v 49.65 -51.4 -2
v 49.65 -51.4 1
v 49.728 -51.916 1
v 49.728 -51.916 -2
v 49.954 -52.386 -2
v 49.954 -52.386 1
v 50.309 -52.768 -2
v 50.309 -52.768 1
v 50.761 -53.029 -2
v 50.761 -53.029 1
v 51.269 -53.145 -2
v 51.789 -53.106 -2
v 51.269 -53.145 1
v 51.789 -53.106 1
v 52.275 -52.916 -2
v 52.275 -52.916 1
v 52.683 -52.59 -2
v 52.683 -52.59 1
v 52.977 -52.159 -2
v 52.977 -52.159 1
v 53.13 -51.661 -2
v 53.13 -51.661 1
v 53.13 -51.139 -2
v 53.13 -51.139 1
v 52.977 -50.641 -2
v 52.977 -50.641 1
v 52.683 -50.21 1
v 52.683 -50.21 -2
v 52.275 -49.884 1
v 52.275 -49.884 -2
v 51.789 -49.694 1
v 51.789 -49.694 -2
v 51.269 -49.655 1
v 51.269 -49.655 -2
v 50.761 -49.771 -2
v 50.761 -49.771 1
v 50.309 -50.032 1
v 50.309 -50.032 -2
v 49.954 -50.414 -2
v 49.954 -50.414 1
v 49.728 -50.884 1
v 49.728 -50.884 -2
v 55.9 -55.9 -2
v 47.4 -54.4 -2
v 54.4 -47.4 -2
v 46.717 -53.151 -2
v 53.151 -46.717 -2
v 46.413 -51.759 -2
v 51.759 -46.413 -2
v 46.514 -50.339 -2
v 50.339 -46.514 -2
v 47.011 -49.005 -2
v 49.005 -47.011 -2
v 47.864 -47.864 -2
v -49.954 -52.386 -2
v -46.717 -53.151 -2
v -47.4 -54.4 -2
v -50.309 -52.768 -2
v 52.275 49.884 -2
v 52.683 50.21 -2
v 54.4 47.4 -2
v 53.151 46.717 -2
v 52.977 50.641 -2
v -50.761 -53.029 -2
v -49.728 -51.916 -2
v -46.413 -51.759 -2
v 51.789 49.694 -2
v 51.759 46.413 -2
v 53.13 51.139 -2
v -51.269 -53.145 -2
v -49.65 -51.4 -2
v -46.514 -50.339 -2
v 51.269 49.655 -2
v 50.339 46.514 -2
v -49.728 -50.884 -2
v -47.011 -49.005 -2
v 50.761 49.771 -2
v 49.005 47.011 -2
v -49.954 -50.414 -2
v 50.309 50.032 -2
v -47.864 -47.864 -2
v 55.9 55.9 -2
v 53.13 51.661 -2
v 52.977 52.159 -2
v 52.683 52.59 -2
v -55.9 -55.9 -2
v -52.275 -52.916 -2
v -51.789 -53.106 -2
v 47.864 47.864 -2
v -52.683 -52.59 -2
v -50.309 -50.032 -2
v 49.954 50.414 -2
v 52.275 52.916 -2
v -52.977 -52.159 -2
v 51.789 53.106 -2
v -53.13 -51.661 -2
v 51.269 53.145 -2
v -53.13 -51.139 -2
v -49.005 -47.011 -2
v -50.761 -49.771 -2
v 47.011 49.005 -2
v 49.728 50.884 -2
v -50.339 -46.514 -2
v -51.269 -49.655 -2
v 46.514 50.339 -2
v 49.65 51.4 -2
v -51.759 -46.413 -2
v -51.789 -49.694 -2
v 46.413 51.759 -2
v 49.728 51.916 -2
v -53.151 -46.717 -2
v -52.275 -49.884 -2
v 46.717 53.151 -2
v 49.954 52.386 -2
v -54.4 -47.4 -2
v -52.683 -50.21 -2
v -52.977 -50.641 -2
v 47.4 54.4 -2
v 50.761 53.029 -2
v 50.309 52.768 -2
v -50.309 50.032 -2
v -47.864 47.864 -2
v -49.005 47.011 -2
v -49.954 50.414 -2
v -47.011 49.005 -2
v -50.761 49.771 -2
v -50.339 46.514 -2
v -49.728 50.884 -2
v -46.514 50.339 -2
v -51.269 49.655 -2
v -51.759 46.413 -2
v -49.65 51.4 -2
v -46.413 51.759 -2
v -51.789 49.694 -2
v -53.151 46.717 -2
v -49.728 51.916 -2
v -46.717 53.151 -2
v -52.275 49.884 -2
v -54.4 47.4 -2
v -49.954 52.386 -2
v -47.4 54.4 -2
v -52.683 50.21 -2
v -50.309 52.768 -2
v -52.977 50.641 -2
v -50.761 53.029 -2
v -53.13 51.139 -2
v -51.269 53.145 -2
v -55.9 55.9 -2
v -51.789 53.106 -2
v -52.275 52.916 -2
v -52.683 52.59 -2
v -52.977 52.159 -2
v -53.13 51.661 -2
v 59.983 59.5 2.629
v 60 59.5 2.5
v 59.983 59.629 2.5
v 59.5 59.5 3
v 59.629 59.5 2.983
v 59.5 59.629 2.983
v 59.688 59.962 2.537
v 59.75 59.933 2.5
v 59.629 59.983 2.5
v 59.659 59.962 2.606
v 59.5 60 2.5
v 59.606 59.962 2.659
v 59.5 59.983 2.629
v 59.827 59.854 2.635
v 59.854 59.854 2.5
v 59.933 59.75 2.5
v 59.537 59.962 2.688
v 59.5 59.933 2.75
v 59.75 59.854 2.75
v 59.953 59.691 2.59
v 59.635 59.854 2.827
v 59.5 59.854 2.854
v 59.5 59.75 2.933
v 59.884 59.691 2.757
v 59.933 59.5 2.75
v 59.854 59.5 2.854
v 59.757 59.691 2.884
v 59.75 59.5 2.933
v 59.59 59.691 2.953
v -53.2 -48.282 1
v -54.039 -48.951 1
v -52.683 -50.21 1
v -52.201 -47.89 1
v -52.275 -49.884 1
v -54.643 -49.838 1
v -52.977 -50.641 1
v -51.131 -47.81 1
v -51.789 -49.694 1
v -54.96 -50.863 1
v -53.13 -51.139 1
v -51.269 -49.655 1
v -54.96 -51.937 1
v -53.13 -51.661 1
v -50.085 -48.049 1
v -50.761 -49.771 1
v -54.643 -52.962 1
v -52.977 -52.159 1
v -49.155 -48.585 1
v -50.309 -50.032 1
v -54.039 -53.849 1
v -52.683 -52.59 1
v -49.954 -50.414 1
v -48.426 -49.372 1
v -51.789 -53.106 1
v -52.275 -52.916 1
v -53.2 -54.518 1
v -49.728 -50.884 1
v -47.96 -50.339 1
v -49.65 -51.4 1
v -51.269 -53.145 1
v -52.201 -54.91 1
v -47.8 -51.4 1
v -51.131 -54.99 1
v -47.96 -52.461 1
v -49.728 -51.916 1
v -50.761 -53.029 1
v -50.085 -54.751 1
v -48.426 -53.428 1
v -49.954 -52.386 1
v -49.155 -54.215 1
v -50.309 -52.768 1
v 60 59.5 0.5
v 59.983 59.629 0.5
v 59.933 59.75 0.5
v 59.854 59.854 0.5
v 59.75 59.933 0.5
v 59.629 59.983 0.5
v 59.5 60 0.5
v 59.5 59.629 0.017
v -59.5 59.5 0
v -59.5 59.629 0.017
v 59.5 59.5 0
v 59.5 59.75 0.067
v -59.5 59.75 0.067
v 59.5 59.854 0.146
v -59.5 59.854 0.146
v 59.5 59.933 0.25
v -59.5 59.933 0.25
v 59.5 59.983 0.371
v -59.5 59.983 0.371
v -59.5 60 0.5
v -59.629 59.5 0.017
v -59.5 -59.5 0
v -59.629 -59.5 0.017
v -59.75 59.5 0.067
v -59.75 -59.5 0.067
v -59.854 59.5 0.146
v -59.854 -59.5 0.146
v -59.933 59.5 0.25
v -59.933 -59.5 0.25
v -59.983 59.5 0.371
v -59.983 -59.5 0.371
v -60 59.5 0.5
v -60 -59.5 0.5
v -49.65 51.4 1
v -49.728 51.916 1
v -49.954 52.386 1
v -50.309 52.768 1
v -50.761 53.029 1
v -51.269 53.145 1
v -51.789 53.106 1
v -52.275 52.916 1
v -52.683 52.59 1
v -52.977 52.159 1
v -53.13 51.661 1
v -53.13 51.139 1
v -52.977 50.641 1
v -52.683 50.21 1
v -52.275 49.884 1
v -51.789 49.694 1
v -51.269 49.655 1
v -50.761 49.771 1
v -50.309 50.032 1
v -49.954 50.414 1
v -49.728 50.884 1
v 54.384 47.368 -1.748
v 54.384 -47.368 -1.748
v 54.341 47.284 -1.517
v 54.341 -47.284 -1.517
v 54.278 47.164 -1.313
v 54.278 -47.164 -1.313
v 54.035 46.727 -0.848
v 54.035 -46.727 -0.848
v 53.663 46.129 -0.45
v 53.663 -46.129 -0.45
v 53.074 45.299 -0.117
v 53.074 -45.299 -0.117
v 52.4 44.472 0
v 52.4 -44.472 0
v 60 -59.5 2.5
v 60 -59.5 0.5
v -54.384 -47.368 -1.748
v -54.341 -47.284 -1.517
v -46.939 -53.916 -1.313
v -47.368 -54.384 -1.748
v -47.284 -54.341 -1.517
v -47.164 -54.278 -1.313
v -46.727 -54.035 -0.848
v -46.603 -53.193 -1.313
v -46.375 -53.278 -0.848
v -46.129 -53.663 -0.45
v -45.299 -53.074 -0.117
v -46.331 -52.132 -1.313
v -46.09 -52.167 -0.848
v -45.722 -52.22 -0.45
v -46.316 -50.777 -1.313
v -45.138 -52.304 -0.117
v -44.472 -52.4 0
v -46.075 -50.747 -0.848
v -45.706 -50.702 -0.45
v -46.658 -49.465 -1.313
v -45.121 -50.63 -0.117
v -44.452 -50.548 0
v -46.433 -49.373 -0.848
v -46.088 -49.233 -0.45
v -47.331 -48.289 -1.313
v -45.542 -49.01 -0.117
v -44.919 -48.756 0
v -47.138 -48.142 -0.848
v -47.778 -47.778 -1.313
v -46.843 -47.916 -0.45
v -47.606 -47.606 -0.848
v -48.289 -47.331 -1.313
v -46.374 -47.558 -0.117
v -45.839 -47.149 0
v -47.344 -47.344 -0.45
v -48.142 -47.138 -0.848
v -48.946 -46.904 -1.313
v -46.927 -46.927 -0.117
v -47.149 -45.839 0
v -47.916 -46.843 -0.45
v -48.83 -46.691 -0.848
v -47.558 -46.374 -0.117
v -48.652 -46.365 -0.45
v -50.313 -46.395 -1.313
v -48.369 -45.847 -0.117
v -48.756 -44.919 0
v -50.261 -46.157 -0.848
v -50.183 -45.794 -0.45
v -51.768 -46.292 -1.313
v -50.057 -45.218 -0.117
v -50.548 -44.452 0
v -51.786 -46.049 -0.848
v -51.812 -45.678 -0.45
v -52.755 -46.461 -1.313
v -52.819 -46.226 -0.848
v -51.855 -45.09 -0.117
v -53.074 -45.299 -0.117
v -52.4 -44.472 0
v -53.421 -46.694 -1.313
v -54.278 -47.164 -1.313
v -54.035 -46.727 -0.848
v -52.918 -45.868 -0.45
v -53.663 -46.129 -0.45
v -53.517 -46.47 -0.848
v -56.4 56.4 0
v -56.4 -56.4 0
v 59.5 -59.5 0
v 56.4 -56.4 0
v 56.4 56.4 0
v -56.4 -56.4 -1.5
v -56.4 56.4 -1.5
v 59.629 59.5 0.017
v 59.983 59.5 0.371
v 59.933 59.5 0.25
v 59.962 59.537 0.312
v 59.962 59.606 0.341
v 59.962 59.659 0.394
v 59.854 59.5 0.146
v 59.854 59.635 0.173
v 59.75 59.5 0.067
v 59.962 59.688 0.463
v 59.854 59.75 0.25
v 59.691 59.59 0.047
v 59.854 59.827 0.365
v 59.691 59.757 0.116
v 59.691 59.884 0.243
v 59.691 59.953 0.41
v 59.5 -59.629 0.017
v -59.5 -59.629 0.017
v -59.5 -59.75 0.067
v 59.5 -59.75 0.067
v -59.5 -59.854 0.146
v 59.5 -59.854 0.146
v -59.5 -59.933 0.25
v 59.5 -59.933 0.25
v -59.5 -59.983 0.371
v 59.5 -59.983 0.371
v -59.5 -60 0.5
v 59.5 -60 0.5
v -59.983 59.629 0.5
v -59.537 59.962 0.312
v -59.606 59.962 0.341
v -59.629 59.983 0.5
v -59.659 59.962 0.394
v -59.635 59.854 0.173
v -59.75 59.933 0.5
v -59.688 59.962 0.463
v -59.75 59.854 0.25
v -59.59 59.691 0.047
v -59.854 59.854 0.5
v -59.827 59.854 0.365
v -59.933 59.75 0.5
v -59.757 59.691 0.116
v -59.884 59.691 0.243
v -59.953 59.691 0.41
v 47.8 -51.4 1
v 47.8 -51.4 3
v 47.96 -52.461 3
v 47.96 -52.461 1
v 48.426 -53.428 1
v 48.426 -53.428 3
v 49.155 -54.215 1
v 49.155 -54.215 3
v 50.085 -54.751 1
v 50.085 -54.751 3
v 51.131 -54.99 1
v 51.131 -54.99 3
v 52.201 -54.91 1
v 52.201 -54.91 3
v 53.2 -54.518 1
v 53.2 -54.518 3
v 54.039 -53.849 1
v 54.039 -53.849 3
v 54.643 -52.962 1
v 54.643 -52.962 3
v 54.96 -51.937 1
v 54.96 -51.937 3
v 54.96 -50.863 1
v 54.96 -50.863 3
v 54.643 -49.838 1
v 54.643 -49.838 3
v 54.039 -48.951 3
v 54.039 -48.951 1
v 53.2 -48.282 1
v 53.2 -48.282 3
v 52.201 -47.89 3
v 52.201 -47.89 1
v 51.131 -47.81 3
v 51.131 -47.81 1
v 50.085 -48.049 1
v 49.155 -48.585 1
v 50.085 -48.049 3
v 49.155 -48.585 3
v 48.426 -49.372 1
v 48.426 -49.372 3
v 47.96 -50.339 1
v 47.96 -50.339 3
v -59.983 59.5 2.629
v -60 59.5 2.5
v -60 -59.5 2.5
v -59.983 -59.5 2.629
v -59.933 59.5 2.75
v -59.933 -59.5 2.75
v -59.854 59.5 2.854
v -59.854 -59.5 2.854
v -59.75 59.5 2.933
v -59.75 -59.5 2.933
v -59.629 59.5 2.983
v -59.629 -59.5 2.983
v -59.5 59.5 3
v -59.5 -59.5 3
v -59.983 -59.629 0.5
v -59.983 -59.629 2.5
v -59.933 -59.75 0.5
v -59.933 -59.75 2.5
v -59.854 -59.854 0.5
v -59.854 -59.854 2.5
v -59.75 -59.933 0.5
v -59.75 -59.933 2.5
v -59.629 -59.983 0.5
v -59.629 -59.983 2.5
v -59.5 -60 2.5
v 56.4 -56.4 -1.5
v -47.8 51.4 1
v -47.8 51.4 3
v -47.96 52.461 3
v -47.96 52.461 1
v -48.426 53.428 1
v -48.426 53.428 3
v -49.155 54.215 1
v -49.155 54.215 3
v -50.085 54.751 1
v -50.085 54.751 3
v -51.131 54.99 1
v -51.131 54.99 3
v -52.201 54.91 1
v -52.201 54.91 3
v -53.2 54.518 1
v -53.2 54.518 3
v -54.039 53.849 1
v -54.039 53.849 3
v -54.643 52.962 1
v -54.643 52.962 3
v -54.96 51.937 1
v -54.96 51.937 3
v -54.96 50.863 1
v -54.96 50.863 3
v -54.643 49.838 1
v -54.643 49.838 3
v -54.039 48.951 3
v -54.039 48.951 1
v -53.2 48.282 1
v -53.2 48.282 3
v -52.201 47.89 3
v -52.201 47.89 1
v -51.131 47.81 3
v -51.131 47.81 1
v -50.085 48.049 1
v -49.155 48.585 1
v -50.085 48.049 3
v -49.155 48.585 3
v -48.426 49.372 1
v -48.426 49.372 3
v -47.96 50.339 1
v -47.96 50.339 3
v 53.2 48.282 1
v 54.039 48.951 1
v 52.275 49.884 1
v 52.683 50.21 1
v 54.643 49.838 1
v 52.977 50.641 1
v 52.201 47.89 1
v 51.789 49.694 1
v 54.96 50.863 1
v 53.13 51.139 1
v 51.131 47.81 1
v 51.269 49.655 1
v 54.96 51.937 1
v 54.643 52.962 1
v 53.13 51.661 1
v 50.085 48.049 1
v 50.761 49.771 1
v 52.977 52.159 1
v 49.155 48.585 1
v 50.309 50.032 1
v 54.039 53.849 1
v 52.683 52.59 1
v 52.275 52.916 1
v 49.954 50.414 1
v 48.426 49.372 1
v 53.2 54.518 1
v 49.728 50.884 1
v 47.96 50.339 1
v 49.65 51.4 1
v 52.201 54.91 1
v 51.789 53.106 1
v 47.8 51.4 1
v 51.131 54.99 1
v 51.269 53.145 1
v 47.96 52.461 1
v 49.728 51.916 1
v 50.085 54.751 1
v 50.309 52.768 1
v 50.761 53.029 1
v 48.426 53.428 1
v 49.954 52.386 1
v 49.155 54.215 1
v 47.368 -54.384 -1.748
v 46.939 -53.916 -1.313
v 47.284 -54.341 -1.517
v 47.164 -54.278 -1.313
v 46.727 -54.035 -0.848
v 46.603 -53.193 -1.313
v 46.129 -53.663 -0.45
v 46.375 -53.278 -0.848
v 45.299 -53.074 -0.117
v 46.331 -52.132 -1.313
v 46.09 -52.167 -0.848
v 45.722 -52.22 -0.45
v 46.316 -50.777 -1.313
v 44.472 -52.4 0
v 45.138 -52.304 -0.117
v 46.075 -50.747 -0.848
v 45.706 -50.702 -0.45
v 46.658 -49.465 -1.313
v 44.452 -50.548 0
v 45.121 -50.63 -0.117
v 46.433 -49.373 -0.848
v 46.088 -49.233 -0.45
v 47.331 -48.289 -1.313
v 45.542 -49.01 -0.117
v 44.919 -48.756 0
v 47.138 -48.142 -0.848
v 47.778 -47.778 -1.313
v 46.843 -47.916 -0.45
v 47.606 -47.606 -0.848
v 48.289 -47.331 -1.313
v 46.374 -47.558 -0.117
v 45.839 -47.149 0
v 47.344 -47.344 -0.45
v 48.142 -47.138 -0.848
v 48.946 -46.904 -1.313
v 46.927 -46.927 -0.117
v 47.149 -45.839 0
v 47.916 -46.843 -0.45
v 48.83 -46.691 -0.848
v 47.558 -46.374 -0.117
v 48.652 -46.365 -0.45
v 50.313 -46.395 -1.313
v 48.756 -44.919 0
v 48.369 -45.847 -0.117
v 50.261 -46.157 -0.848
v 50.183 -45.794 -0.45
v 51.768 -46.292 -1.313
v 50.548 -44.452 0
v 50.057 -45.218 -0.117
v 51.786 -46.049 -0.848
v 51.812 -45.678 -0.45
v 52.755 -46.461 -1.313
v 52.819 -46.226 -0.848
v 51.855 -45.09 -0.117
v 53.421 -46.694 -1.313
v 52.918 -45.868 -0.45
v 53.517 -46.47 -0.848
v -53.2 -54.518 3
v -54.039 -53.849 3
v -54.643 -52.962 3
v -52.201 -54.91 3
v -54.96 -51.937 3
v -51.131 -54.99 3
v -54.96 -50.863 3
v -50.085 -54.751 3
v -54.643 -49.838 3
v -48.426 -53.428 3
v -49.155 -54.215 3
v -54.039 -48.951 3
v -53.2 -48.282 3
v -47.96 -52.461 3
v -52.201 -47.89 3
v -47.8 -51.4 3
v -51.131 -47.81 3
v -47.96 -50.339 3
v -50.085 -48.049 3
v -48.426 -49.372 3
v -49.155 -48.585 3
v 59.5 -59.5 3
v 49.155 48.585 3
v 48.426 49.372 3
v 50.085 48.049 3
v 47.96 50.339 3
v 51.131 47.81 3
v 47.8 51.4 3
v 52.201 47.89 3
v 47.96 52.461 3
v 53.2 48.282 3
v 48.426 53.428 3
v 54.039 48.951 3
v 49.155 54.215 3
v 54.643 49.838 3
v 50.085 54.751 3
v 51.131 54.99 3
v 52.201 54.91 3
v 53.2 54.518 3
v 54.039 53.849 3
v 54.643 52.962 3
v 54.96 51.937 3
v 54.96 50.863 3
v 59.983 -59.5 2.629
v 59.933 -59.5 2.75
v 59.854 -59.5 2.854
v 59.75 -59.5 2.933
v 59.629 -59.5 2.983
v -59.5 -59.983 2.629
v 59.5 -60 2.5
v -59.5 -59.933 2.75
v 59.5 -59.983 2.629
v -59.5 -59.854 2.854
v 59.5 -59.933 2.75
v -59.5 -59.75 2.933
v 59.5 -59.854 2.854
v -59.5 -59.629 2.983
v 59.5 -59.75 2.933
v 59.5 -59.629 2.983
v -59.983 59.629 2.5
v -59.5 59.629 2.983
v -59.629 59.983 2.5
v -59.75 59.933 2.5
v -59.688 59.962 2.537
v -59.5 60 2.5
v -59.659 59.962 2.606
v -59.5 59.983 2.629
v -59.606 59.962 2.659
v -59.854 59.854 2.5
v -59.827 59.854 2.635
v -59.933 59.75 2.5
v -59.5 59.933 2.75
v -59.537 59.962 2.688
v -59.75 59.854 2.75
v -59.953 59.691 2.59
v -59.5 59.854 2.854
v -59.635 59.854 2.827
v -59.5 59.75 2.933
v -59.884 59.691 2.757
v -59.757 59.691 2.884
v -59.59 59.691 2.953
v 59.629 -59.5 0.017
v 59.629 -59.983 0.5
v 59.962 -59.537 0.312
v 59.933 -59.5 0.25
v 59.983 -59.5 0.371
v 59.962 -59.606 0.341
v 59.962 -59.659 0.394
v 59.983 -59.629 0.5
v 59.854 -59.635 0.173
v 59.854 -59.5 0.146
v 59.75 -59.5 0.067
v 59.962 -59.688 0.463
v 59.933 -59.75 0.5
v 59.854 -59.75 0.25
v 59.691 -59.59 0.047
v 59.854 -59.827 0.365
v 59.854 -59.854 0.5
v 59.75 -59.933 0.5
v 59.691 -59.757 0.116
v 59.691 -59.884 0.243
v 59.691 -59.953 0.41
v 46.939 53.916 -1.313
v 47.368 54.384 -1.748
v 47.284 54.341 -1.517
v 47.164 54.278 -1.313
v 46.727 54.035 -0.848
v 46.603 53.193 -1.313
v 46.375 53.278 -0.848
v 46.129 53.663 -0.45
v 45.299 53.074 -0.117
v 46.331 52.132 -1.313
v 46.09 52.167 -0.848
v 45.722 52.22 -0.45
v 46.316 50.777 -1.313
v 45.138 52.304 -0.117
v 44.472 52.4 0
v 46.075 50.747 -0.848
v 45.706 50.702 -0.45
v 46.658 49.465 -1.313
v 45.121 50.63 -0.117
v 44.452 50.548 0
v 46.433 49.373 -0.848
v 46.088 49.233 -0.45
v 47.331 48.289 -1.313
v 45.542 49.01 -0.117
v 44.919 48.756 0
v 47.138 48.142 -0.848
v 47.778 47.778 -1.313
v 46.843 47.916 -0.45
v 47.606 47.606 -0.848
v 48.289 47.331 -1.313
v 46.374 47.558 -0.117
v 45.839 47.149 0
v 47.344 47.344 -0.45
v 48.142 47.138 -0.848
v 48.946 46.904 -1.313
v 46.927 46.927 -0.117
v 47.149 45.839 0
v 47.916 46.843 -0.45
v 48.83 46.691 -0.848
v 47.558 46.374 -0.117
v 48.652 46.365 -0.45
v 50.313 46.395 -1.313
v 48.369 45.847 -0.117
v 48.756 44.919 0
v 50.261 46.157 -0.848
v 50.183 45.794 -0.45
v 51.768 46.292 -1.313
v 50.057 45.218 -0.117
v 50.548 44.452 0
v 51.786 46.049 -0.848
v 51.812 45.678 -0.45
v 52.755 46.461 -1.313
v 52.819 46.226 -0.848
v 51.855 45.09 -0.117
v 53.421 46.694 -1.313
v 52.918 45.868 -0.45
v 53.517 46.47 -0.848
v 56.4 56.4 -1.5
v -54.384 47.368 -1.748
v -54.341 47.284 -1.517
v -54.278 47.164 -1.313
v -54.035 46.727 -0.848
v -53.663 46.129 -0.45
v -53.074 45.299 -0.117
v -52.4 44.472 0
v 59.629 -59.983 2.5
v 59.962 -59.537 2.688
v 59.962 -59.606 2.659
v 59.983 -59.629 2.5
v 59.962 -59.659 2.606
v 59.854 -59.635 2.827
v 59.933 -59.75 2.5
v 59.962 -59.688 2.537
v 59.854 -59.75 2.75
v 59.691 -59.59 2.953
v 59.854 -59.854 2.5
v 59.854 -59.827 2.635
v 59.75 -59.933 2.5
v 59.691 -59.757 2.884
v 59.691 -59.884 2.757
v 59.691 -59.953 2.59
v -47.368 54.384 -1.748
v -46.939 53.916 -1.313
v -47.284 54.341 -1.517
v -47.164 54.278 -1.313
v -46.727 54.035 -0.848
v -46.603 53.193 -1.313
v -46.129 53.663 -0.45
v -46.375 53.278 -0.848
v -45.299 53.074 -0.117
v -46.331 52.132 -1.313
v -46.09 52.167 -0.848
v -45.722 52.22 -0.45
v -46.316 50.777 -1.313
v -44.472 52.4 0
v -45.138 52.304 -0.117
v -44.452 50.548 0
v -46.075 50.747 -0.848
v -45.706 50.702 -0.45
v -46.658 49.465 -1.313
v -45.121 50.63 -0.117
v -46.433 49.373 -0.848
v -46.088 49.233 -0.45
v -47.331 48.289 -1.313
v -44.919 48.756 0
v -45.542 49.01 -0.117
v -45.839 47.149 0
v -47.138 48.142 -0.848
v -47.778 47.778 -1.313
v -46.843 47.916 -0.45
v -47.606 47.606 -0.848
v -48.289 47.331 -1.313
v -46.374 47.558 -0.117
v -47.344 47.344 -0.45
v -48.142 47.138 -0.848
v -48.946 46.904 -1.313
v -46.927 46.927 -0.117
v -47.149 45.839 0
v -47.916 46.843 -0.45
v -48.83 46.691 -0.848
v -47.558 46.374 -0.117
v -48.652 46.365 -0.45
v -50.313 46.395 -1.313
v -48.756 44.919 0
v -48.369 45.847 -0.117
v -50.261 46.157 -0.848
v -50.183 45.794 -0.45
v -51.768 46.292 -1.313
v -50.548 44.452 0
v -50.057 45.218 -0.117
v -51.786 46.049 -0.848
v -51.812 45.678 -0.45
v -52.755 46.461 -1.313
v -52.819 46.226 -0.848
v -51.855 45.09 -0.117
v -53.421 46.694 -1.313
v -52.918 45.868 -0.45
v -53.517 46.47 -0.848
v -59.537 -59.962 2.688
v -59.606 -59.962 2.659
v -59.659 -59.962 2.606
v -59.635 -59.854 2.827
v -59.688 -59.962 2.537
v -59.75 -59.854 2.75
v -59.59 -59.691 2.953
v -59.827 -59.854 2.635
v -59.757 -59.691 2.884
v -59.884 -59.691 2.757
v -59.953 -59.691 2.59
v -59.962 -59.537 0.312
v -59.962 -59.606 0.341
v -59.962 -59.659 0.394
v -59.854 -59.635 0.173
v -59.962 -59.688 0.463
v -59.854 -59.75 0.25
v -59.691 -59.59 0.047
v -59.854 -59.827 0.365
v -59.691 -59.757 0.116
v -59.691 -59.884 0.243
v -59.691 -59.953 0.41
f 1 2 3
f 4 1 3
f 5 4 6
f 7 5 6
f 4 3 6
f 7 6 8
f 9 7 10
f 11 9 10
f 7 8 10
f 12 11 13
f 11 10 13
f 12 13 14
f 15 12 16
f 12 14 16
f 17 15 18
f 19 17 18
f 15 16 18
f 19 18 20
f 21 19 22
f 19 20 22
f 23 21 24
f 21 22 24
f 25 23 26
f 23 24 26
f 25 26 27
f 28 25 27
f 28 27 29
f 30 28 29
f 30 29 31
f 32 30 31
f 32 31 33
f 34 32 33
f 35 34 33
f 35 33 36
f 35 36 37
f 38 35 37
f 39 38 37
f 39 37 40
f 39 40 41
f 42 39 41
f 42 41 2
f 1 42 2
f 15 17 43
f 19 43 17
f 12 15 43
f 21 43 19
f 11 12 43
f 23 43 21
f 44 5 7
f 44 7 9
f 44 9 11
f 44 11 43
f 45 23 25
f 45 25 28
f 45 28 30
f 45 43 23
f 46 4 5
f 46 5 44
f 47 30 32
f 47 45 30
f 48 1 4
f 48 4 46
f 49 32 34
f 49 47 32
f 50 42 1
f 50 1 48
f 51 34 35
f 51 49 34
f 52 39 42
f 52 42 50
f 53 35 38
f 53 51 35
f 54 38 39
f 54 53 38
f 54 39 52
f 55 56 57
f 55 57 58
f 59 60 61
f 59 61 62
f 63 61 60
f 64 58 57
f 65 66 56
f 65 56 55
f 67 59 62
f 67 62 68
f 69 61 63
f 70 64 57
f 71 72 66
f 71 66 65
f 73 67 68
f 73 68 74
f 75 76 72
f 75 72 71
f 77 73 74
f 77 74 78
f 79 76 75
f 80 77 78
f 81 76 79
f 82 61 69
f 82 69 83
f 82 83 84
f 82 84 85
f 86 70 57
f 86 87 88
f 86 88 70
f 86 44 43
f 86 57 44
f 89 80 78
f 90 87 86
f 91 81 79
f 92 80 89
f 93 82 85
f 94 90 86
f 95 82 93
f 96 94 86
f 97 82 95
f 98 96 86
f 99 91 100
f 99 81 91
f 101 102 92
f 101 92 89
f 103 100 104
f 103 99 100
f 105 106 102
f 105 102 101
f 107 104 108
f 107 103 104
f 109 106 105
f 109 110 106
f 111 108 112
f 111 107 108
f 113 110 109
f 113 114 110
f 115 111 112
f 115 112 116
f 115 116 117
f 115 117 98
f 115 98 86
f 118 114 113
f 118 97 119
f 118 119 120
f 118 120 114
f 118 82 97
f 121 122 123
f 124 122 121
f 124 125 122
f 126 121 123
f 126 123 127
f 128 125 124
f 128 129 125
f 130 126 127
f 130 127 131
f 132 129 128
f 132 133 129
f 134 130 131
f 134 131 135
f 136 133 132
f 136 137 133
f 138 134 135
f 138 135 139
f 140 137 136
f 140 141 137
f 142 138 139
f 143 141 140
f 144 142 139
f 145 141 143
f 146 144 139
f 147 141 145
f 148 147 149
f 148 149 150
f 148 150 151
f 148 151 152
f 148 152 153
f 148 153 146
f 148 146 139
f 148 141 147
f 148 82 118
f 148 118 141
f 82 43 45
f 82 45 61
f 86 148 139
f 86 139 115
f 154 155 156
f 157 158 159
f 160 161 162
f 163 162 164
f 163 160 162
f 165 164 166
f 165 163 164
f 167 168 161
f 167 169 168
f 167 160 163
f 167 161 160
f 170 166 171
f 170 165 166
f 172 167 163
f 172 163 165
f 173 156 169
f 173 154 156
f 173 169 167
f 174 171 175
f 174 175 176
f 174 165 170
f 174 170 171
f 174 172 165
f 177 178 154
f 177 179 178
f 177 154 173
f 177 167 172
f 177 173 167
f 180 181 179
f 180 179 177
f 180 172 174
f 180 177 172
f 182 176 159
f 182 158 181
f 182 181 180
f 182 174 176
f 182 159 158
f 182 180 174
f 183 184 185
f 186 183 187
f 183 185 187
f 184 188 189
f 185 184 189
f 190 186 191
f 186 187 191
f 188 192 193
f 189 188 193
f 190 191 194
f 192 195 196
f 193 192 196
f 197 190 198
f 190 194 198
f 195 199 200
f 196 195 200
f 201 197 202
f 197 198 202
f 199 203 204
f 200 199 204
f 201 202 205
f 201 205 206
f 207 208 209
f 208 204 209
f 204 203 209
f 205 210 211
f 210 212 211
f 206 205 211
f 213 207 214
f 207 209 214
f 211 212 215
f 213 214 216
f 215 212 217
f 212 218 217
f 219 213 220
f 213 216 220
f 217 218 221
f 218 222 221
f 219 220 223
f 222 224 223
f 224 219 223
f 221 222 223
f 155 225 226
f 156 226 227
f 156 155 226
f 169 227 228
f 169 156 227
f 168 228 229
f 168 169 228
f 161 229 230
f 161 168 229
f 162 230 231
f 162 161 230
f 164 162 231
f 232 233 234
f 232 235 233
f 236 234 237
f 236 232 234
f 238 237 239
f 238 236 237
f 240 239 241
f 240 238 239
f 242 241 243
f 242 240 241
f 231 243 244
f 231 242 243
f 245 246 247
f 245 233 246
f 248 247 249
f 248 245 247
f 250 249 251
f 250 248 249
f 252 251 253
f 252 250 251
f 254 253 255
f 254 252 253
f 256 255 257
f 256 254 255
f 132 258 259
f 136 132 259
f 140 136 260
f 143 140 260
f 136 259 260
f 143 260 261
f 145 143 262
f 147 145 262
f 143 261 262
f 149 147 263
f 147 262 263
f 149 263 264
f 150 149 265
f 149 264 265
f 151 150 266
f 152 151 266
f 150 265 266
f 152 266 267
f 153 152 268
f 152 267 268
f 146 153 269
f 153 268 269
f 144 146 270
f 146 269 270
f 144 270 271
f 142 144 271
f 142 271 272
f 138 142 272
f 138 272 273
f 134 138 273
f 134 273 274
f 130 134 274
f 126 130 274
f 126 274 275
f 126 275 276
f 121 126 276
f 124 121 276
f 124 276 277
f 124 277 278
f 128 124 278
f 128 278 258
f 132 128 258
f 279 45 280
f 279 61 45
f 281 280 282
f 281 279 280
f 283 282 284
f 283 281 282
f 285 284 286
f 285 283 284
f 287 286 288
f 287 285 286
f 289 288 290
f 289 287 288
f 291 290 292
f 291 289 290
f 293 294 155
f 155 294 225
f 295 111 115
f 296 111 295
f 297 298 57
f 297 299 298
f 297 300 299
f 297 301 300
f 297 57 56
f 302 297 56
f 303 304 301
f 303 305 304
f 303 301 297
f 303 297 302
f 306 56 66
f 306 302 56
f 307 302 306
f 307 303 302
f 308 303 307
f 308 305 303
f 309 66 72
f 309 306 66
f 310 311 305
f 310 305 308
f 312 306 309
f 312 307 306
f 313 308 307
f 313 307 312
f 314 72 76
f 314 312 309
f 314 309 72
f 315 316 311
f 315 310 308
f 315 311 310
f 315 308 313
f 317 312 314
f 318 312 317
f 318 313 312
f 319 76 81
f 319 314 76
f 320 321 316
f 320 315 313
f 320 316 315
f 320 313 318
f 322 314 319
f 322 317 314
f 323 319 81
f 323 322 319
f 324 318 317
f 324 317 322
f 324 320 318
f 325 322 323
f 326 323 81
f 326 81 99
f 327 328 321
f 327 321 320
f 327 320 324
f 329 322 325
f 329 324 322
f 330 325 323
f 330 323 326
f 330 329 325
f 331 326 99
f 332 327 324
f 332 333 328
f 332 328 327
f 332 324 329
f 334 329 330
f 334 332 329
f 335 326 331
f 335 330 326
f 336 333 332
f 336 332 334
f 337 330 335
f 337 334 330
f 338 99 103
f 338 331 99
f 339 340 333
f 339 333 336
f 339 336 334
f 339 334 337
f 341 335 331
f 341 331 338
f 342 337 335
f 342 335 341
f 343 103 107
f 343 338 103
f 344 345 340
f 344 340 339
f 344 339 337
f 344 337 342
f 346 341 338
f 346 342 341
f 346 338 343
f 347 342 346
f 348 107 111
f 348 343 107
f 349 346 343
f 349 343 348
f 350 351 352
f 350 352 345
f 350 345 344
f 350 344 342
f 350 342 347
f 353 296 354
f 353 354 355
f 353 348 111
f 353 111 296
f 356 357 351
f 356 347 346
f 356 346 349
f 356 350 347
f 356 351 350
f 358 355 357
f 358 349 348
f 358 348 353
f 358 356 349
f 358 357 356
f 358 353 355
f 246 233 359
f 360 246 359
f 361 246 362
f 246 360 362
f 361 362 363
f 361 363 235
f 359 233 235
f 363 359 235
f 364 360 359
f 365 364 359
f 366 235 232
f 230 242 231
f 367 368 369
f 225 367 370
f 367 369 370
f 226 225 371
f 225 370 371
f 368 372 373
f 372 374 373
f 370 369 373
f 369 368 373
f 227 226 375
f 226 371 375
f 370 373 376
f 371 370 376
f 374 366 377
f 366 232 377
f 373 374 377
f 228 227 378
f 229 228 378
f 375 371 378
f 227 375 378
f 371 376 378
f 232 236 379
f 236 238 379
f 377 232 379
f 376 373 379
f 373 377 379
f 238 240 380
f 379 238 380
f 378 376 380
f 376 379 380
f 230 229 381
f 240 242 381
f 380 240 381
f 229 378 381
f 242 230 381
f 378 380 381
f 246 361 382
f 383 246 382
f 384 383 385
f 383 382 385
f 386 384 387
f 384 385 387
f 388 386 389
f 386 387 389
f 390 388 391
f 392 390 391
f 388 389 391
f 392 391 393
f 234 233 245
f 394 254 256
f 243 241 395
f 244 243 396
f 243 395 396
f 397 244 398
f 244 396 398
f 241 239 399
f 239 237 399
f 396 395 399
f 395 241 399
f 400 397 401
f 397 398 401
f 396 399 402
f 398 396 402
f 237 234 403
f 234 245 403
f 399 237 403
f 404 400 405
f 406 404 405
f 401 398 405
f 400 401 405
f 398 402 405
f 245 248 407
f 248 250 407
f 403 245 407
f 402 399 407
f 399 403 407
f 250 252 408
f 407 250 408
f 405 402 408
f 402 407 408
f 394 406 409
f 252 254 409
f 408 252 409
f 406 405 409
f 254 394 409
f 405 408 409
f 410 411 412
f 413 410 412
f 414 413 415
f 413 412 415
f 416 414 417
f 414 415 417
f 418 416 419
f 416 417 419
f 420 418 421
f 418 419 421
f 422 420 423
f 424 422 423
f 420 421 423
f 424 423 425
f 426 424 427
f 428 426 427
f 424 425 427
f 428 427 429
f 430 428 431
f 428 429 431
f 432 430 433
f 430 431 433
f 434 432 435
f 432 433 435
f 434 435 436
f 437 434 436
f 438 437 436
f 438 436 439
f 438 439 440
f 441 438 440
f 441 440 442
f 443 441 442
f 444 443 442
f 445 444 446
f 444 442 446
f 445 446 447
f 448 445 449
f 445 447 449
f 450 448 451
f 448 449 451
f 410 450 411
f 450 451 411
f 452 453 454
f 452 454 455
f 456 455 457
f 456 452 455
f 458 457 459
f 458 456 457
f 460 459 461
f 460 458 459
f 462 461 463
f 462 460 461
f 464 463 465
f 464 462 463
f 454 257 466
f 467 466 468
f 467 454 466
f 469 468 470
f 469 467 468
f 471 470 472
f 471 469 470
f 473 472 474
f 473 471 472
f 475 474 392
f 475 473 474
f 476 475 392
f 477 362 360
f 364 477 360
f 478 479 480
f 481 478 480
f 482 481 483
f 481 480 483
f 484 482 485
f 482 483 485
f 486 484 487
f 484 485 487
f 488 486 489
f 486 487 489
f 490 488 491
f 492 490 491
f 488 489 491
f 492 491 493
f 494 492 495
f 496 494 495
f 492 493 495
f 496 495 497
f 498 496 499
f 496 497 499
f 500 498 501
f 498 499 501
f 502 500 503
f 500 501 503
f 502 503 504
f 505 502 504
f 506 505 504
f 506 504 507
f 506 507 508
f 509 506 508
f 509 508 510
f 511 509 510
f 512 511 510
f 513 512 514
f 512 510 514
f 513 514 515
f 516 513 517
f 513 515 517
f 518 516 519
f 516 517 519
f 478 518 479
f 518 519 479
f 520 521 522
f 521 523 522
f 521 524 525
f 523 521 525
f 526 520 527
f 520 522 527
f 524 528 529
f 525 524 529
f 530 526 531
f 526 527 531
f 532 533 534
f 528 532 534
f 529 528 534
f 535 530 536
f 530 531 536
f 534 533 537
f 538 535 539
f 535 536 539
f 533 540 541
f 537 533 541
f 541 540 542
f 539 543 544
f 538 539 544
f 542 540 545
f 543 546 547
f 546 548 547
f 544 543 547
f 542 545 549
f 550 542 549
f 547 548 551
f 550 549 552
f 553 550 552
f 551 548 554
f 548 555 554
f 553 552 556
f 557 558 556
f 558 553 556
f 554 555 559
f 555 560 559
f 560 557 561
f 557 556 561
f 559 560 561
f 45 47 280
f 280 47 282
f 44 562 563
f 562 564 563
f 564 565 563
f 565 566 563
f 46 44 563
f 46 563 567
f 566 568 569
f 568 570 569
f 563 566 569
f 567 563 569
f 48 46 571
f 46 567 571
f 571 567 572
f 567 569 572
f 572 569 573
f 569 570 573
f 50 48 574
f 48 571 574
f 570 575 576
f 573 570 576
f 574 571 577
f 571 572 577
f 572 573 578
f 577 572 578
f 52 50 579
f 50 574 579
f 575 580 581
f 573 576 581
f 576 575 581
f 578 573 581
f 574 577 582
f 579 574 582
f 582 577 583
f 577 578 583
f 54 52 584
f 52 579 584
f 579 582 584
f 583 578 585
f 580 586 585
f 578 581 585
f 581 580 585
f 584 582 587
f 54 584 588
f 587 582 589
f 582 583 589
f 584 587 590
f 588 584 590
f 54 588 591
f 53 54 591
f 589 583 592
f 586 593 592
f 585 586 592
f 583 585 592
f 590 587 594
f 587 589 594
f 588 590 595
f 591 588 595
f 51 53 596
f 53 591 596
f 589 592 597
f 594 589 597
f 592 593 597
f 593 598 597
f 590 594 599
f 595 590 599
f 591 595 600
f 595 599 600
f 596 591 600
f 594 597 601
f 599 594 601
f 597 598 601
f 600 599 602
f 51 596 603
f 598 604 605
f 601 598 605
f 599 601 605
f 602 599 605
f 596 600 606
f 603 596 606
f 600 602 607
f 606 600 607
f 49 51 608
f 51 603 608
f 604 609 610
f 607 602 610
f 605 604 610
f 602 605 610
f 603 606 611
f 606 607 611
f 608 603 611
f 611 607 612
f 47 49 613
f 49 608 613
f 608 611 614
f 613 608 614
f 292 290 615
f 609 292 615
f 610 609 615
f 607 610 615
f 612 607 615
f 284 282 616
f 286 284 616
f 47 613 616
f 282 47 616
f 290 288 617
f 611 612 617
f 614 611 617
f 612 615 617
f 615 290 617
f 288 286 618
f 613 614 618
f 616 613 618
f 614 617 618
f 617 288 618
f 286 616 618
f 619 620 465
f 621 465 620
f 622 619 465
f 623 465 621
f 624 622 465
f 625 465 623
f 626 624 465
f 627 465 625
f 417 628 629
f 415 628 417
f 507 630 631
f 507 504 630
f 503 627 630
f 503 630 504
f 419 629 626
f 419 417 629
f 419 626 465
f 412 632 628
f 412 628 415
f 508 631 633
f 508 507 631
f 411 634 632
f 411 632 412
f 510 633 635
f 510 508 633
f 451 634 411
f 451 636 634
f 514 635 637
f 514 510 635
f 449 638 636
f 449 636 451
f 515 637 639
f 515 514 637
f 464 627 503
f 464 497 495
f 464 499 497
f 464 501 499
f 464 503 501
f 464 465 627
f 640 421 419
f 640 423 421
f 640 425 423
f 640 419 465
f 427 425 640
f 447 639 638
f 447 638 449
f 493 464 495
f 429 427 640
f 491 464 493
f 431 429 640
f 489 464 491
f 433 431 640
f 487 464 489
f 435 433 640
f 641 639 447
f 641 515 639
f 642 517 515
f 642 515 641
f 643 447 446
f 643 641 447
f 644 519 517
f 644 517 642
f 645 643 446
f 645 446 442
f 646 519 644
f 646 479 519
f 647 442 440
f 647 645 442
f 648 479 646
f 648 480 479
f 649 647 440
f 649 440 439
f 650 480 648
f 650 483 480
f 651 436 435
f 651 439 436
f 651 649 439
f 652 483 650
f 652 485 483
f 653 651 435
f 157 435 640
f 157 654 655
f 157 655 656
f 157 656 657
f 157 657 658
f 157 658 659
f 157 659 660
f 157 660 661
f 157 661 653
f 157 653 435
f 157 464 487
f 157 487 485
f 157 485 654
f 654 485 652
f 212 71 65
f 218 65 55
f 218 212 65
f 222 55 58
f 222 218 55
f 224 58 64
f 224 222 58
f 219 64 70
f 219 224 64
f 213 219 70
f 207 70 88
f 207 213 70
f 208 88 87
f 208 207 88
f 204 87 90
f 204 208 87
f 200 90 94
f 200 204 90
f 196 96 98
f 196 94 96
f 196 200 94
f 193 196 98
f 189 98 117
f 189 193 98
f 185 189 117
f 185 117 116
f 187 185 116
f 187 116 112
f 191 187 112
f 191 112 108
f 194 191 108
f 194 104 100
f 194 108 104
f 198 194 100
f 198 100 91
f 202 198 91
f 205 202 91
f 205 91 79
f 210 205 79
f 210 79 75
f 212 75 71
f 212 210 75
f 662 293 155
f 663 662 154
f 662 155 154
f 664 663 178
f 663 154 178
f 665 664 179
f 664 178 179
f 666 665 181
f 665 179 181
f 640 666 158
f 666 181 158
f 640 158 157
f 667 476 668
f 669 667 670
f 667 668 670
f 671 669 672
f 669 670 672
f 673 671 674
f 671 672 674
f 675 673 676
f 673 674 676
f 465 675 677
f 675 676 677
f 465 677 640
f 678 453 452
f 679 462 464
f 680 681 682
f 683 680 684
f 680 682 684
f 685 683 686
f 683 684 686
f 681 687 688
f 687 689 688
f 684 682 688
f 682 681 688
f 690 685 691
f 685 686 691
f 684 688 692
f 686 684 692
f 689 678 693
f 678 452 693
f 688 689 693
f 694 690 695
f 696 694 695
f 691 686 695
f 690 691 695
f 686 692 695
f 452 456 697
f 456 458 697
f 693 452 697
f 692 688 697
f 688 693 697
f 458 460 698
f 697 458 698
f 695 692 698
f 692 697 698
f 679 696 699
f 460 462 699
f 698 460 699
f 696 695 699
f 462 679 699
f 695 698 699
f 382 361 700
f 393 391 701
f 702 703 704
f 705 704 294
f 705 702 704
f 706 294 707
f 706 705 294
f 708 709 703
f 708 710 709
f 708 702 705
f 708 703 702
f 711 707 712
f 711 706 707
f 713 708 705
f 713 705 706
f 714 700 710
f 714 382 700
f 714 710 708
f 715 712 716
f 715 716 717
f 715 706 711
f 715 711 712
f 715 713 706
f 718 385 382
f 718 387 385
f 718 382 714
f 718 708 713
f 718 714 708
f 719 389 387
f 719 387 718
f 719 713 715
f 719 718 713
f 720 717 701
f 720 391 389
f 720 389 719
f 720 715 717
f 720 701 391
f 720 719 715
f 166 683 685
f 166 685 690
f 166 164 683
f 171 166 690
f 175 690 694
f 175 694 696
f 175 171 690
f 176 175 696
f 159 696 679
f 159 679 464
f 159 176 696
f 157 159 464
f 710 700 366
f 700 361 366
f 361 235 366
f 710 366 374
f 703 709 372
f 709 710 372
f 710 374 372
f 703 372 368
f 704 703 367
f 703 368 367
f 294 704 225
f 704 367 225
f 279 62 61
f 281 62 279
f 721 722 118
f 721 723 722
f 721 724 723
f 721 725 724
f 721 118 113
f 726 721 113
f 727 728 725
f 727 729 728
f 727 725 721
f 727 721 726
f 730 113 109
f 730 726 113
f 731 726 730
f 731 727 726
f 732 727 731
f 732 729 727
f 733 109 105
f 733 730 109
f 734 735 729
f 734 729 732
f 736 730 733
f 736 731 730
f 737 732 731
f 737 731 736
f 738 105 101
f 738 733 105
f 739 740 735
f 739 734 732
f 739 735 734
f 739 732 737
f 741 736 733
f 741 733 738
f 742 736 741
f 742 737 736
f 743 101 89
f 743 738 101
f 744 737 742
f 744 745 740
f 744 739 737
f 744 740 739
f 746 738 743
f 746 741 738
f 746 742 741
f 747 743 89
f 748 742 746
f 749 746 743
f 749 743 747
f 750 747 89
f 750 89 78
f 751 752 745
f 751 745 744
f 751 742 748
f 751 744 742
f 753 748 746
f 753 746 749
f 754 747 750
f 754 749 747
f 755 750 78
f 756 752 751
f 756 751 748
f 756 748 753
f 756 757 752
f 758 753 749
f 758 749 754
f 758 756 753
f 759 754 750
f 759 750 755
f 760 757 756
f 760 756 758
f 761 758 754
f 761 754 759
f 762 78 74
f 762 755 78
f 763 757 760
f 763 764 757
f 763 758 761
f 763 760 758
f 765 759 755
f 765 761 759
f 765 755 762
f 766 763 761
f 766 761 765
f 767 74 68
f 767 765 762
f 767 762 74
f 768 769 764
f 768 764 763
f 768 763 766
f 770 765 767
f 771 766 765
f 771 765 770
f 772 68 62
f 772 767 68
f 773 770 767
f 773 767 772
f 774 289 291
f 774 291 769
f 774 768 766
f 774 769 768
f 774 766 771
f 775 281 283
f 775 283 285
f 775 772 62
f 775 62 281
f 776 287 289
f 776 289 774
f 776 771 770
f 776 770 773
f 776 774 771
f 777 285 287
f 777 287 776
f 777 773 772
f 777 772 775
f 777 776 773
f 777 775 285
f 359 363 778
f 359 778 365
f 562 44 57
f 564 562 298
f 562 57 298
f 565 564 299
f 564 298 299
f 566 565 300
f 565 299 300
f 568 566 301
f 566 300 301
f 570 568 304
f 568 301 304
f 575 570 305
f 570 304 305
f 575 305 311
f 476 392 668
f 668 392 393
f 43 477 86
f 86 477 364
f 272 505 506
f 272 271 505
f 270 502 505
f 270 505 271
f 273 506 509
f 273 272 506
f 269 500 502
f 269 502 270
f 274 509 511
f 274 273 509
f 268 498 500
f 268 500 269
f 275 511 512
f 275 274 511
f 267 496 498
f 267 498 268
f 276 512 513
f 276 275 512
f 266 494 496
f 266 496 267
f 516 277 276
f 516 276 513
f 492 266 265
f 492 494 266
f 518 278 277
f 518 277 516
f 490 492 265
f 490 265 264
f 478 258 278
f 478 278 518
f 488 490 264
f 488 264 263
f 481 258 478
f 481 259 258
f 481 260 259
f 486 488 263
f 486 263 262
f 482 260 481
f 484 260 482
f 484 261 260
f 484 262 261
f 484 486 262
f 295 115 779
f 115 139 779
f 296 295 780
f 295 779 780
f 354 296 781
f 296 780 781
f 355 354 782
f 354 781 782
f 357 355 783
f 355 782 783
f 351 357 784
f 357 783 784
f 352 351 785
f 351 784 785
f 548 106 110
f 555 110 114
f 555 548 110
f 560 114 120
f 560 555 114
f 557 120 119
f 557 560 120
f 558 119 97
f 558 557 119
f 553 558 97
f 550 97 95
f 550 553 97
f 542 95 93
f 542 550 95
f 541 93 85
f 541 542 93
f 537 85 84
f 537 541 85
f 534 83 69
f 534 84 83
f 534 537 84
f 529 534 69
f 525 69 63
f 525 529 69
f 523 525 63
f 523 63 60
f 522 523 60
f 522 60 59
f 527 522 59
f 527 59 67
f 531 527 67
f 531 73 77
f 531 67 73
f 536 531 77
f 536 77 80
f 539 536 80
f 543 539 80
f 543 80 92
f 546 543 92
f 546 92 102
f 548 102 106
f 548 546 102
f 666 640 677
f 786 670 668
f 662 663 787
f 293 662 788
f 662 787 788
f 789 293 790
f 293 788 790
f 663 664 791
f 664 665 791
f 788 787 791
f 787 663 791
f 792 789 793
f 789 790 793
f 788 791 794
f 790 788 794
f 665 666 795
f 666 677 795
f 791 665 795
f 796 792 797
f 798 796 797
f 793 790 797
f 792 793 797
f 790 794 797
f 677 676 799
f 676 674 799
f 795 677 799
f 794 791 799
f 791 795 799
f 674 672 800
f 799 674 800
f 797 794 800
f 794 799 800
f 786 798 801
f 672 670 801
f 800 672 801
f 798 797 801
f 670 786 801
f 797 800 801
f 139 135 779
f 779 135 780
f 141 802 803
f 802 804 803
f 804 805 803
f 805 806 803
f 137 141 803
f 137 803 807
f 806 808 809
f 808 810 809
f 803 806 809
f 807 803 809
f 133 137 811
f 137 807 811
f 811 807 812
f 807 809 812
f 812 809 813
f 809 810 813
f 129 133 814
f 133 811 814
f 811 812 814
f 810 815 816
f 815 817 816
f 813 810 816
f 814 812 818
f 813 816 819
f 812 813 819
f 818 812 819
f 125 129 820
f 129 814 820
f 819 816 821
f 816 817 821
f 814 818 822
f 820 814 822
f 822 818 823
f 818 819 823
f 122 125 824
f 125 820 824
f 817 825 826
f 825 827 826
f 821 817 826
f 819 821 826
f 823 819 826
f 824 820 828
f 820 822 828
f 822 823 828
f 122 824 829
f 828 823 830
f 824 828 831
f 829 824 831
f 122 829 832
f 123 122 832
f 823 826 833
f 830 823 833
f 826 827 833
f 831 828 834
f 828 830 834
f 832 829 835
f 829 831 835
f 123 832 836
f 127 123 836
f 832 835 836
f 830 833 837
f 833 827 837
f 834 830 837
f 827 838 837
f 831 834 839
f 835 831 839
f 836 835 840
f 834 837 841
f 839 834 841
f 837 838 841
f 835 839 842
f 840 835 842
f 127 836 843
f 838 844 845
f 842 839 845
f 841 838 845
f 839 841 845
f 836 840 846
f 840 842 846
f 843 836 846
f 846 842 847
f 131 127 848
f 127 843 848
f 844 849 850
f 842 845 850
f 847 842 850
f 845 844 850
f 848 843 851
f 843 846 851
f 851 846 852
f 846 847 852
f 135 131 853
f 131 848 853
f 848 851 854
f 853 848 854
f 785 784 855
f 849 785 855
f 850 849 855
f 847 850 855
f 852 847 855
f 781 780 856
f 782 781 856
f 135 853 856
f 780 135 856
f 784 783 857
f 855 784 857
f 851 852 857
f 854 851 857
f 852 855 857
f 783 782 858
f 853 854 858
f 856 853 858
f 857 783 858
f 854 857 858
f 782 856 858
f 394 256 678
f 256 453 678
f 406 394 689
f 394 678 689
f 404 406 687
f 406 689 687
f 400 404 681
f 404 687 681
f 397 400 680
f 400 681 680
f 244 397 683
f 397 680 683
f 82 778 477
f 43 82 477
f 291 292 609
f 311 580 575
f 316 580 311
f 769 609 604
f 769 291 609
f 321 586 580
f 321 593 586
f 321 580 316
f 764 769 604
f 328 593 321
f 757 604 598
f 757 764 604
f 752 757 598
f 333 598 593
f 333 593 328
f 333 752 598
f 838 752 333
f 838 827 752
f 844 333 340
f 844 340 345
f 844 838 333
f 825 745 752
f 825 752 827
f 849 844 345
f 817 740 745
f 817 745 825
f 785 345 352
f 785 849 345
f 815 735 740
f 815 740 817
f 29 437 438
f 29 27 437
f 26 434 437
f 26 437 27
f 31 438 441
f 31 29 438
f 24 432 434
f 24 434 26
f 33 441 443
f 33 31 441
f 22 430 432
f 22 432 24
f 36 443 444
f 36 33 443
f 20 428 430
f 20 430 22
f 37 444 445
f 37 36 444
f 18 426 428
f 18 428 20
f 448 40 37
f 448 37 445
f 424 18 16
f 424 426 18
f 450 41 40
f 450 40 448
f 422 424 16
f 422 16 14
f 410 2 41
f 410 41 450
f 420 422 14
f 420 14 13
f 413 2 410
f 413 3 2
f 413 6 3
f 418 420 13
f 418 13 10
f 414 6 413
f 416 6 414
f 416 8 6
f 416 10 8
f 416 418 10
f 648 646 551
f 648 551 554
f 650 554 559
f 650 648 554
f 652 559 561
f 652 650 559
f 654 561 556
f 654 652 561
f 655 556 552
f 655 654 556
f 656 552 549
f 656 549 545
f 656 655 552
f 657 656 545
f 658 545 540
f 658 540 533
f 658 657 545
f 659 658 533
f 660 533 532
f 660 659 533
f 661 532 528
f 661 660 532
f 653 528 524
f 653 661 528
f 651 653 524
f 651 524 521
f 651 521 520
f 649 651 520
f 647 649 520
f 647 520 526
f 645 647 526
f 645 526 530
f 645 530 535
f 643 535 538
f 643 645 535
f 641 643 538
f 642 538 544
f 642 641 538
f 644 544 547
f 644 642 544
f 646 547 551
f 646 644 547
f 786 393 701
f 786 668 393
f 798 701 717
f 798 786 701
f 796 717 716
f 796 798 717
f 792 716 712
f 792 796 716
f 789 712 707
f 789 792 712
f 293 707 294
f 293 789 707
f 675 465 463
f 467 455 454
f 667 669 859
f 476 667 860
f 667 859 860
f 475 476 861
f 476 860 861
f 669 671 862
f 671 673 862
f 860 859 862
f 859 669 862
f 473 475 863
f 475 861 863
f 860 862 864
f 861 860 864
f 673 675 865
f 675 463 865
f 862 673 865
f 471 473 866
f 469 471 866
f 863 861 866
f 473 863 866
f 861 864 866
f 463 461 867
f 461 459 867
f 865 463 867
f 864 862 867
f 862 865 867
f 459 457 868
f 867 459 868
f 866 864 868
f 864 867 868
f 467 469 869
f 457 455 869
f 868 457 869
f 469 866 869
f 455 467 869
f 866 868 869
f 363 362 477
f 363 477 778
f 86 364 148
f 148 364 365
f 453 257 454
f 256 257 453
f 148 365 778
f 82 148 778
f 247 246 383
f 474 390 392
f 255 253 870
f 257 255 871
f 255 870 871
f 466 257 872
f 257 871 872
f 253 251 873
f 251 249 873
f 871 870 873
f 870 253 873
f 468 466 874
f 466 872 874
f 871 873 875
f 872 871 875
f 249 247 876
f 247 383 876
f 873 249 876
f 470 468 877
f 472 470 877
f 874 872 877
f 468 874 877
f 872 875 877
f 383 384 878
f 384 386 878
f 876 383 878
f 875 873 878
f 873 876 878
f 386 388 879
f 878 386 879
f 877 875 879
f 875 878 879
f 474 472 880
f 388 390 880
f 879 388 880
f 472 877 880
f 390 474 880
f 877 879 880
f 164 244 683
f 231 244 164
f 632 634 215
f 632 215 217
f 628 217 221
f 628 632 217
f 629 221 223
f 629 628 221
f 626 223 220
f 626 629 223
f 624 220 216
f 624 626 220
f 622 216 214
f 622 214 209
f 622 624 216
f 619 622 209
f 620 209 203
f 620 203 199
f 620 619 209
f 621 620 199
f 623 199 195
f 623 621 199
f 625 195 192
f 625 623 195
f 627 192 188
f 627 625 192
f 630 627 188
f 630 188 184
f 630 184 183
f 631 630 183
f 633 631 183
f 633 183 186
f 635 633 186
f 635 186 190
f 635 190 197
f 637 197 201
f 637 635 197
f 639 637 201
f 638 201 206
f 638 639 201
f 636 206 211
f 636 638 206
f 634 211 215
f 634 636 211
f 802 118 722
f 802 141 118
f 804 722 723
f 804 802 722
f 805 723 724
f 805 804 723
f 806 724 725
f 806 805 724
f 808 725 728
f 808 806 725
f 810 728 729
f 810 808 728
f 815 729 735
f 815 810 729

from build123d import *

# Parameters (mm, degrees)
ESBO_O1_W                 = 120
ESBO_O1_H                 = 120
RESSALTO_EXTRUS_O1_DEPTH  = 3
ESBO_O2_W                 = 112.8
ESBO_O2_H                 = 112.8
RESSALTO_EXTRUS_O2_DEPTH  = 2
ESBO_O3_W                 = 108.8
ESBO_O3_H                 = 108.8
CORTE_EXTRUS_O1_DEPTH     = 2
ESBO_O5_R                 = 5
RESSALTO_EXTRUS_O3_DEPTH  = 2
ESPELHAR2_COPY_1_SKETCH_R = 5
ESPELHAR2_COPY_1_DEPTH    = 2
CHANFRO1_SIZE             = 0.5
FILETE1_R                 = 2
ESBO_O6_R                 = 3.6
CORTE_EXTRUS_O2_DEPTH     = 2
ESBO_O7_R                 = 1.75
CORTE_EXTRUS_O3_DEPTH     = 85.905830189
ESPELHAR4_COPY_1_SKETCH_R = 3.6
ESPELHAR4_COPY_1_DEPTH    = 2
ESPELHAR4_COPY_2_SKETCH_R = 1.75
ESPELHAR4_COPY_2_DEPTH    = 85.905830189
FILETE2_R                 = 0.5


with BuildPart() as part:
    # Esboço1 → Ressalto-extrusão1 (new body)
    with BuildSketch(Plane.XY):
        Rectangle(ESBO_O1_W, ESBO_O1_H)
    extrude(amount=RESSALTO_EXTRUS_O1_DEPTH)

    # Esboço2 → Ressalto-extrusão2 (add)
    with BuildSketch(Plane(origin=(0, 0, 0), x_dir=(-1, 0, 0), z_dir=(0, 0, -1))):
        Rectangle(ESBO_O2_W, ESBO_O2_H)
    extrude(amount=RESSALTO_EXTRUS_O2_DEPTH)

    # Esboço3 → Corte-extrusão1 (cut)
    with BuildSketch(Plane(origin=(0, 0, -2), x_dir=(-1, 0, 0), z_dir=(0, 0, -1))):
        Rectangle(ESBO_O3_W, ESBO_O3_H)
    extrude(amount=-CORTE_EXTRUS_O1_DEPTH, mode=Mode.SUBTRACT)

    # Esboço5 → Ressalto-extrusão3 (add)
    with BuildSketch(Plane(origin=(0, 0, 0), x_dir=(-1, 0, 0), z_dir=(0, 0, -1))):
        with Locations((51.4, 51.4)):
            Circle(ESBO_O5_R)
    ressalto_extrus_o3 = extrude(amount=RESSALTO_EXTRUS_O3_DEPTH)

    # Espelhar1: Ressalto-extrusão3 across plane
    add(ressalto_extrus_o3.mirror(Plane(origin=(0, 0, 0), x_dir=(0, 0, 1), z_dir=(1, 0, 0))))

    # Espelhar2: Ressalto-extrusão3 across plane
    add(ressalto_extrus_o3.mirror(Plane.ZX))

    # Espelhar2 copy 1 sketch → Espelhar2 copy 1 (add)
    with BuildSketch(Plane(origin=(0, 0, 0), x_dir=(1, 0, 0), z_dir=(0, 0, -1))):
        with Locations((51.4, 51.4)):
            Circle(ESPELHAR2_COPY_1_SKETCH_R)
    extrude(amount=ESPELHAR2_COPY_1_DEPTH)

    # Chanfro1
    chanfro1_edges = [part.edges().sort_by_distance(p)[0] for p in [
        (0, 56.4, -2),
        (56.4, 0, -2),
        (0, -56.4, -2),
        (-56.4, 0, -2),
    ]]
    chamfer(chanfro1_edges, length=CHANFRO1_SIZE)

    # Filete1
    filete1_edges = [part.edges().sort_by_distance(p)[0] for p in [
        (0, -54.4, 0),
        (47.864466094, -47.864466094, 0),
        (54.4, 0, 0),
        (47.864466094, 47.864466094, 0),
        (0, 54.4, 0),
        (-47.864466094, 47.864466094, 0),
        (-54.4, 0, 0),
        (-47.864466094, -47.864466094, 0),
    ]]
    fillet(filete1_edges, radius=FILETE1_R - 0.0001)  # a hair under: the kernel refuses the full size

    # Esboço6 → Corte-extrusão2 (cut)
    with BuildSketch(Plane.XY.offset(3)):
        with Locations((-51.4, 51.4)):
            Circle(ESBO_O6_R)
    corte_extrus_o2 = extrude(amount=-CORTE_EXTRUS_O2_DEPTH, mode=Mode.SUBTRACT)

    # Esboço7 → Corte-extrusão3 (cut, through all)
    with BuildSketch(Plane.XY.offset(1)):
        with Locations((-51.4, 51.4)):
            Circle(ESBO_O7_R)
    corte_extrus_o3 = extrude(amount=-CORTE_EXTRUS_O3_DEPTH, mode=Mode.SUBTRACT)

    # Espelhar3: Corte-extrusão2, Corte-extrusão3 across plane
    add(corte_extrus_o2.mirror(Plane(origin=(0, 0, 0), x_dir=(0, 0, 1), z_dir=(1, 0, 0))), mode=Mode.SUBTRACT)
    add(corte_extrus_o3.mirror(Plane(origin=(0, 0, 0), x_dir=(0, 0, 1), z_dir=(1, 0, 0))), mode=Mode.SUBTRACT)

    # Espelhar4: Corte-extrusão2, Corte-extrusão3 across plane
    add(corte_extrus_o2.mirror(Plane.ZX), mode=Mode.SUBTRACT)
    add(corte_extrus_o3.mirror(Plane.ZX), mode=Mode.SUBTRACT)

    # Espelhar4 copy 1 sketch → Espelhar4 copy 1 (cut)
    with BuildSketch(Plane(origin=(0, 0, 3), x_dir=(-1, 0, 0), z_dir=(0, 0, 1))):
        with Locations((-51.4, 51.4)):
            Circle(ESPELHAR4_COPY_1_SKETCH_R)
    extrude(amount=-ESPELHAR4_COPY_1_DEPTH, mode=Mode.SUBTRACT)

    # Espelhar4 copy 2 sketch → Espelhar4 copy 2 (cut, through all)
    with BuildSketch(Plane(origin=(0, 0, 1), x_dir=(-1, 0, 0), z_dir=(0, 0, 1))):
        with Locations((-51.4, 51.4)):
            Circle(ESPELHAR4_COPY_2_SKETCH_R)
    extrude(amount=-ESPELHAR4_COPY_2_DEPTH, mode=Mode.SUBTRACT)

    # Filete2
    filete2_edges = [part.edges().sort_by_distance(p)[0] for p in [
        (-60, 0, 3),
        (0, -60, 3),
        (60, 0, 3),
        (0, -60, 0),
        (-60, 0, 0),
        (0, 60, 0),
        (60, 0, 0),
        (60, -60, 1.5),
        (-60, -60, 1.5),
        (-60, 60, 1.5),
        (60, 60, 1.5),
        (0, 60, 3),
    ]]
    fillet(filete2_edges, radius=FILETE2_R)


solid = part.part
